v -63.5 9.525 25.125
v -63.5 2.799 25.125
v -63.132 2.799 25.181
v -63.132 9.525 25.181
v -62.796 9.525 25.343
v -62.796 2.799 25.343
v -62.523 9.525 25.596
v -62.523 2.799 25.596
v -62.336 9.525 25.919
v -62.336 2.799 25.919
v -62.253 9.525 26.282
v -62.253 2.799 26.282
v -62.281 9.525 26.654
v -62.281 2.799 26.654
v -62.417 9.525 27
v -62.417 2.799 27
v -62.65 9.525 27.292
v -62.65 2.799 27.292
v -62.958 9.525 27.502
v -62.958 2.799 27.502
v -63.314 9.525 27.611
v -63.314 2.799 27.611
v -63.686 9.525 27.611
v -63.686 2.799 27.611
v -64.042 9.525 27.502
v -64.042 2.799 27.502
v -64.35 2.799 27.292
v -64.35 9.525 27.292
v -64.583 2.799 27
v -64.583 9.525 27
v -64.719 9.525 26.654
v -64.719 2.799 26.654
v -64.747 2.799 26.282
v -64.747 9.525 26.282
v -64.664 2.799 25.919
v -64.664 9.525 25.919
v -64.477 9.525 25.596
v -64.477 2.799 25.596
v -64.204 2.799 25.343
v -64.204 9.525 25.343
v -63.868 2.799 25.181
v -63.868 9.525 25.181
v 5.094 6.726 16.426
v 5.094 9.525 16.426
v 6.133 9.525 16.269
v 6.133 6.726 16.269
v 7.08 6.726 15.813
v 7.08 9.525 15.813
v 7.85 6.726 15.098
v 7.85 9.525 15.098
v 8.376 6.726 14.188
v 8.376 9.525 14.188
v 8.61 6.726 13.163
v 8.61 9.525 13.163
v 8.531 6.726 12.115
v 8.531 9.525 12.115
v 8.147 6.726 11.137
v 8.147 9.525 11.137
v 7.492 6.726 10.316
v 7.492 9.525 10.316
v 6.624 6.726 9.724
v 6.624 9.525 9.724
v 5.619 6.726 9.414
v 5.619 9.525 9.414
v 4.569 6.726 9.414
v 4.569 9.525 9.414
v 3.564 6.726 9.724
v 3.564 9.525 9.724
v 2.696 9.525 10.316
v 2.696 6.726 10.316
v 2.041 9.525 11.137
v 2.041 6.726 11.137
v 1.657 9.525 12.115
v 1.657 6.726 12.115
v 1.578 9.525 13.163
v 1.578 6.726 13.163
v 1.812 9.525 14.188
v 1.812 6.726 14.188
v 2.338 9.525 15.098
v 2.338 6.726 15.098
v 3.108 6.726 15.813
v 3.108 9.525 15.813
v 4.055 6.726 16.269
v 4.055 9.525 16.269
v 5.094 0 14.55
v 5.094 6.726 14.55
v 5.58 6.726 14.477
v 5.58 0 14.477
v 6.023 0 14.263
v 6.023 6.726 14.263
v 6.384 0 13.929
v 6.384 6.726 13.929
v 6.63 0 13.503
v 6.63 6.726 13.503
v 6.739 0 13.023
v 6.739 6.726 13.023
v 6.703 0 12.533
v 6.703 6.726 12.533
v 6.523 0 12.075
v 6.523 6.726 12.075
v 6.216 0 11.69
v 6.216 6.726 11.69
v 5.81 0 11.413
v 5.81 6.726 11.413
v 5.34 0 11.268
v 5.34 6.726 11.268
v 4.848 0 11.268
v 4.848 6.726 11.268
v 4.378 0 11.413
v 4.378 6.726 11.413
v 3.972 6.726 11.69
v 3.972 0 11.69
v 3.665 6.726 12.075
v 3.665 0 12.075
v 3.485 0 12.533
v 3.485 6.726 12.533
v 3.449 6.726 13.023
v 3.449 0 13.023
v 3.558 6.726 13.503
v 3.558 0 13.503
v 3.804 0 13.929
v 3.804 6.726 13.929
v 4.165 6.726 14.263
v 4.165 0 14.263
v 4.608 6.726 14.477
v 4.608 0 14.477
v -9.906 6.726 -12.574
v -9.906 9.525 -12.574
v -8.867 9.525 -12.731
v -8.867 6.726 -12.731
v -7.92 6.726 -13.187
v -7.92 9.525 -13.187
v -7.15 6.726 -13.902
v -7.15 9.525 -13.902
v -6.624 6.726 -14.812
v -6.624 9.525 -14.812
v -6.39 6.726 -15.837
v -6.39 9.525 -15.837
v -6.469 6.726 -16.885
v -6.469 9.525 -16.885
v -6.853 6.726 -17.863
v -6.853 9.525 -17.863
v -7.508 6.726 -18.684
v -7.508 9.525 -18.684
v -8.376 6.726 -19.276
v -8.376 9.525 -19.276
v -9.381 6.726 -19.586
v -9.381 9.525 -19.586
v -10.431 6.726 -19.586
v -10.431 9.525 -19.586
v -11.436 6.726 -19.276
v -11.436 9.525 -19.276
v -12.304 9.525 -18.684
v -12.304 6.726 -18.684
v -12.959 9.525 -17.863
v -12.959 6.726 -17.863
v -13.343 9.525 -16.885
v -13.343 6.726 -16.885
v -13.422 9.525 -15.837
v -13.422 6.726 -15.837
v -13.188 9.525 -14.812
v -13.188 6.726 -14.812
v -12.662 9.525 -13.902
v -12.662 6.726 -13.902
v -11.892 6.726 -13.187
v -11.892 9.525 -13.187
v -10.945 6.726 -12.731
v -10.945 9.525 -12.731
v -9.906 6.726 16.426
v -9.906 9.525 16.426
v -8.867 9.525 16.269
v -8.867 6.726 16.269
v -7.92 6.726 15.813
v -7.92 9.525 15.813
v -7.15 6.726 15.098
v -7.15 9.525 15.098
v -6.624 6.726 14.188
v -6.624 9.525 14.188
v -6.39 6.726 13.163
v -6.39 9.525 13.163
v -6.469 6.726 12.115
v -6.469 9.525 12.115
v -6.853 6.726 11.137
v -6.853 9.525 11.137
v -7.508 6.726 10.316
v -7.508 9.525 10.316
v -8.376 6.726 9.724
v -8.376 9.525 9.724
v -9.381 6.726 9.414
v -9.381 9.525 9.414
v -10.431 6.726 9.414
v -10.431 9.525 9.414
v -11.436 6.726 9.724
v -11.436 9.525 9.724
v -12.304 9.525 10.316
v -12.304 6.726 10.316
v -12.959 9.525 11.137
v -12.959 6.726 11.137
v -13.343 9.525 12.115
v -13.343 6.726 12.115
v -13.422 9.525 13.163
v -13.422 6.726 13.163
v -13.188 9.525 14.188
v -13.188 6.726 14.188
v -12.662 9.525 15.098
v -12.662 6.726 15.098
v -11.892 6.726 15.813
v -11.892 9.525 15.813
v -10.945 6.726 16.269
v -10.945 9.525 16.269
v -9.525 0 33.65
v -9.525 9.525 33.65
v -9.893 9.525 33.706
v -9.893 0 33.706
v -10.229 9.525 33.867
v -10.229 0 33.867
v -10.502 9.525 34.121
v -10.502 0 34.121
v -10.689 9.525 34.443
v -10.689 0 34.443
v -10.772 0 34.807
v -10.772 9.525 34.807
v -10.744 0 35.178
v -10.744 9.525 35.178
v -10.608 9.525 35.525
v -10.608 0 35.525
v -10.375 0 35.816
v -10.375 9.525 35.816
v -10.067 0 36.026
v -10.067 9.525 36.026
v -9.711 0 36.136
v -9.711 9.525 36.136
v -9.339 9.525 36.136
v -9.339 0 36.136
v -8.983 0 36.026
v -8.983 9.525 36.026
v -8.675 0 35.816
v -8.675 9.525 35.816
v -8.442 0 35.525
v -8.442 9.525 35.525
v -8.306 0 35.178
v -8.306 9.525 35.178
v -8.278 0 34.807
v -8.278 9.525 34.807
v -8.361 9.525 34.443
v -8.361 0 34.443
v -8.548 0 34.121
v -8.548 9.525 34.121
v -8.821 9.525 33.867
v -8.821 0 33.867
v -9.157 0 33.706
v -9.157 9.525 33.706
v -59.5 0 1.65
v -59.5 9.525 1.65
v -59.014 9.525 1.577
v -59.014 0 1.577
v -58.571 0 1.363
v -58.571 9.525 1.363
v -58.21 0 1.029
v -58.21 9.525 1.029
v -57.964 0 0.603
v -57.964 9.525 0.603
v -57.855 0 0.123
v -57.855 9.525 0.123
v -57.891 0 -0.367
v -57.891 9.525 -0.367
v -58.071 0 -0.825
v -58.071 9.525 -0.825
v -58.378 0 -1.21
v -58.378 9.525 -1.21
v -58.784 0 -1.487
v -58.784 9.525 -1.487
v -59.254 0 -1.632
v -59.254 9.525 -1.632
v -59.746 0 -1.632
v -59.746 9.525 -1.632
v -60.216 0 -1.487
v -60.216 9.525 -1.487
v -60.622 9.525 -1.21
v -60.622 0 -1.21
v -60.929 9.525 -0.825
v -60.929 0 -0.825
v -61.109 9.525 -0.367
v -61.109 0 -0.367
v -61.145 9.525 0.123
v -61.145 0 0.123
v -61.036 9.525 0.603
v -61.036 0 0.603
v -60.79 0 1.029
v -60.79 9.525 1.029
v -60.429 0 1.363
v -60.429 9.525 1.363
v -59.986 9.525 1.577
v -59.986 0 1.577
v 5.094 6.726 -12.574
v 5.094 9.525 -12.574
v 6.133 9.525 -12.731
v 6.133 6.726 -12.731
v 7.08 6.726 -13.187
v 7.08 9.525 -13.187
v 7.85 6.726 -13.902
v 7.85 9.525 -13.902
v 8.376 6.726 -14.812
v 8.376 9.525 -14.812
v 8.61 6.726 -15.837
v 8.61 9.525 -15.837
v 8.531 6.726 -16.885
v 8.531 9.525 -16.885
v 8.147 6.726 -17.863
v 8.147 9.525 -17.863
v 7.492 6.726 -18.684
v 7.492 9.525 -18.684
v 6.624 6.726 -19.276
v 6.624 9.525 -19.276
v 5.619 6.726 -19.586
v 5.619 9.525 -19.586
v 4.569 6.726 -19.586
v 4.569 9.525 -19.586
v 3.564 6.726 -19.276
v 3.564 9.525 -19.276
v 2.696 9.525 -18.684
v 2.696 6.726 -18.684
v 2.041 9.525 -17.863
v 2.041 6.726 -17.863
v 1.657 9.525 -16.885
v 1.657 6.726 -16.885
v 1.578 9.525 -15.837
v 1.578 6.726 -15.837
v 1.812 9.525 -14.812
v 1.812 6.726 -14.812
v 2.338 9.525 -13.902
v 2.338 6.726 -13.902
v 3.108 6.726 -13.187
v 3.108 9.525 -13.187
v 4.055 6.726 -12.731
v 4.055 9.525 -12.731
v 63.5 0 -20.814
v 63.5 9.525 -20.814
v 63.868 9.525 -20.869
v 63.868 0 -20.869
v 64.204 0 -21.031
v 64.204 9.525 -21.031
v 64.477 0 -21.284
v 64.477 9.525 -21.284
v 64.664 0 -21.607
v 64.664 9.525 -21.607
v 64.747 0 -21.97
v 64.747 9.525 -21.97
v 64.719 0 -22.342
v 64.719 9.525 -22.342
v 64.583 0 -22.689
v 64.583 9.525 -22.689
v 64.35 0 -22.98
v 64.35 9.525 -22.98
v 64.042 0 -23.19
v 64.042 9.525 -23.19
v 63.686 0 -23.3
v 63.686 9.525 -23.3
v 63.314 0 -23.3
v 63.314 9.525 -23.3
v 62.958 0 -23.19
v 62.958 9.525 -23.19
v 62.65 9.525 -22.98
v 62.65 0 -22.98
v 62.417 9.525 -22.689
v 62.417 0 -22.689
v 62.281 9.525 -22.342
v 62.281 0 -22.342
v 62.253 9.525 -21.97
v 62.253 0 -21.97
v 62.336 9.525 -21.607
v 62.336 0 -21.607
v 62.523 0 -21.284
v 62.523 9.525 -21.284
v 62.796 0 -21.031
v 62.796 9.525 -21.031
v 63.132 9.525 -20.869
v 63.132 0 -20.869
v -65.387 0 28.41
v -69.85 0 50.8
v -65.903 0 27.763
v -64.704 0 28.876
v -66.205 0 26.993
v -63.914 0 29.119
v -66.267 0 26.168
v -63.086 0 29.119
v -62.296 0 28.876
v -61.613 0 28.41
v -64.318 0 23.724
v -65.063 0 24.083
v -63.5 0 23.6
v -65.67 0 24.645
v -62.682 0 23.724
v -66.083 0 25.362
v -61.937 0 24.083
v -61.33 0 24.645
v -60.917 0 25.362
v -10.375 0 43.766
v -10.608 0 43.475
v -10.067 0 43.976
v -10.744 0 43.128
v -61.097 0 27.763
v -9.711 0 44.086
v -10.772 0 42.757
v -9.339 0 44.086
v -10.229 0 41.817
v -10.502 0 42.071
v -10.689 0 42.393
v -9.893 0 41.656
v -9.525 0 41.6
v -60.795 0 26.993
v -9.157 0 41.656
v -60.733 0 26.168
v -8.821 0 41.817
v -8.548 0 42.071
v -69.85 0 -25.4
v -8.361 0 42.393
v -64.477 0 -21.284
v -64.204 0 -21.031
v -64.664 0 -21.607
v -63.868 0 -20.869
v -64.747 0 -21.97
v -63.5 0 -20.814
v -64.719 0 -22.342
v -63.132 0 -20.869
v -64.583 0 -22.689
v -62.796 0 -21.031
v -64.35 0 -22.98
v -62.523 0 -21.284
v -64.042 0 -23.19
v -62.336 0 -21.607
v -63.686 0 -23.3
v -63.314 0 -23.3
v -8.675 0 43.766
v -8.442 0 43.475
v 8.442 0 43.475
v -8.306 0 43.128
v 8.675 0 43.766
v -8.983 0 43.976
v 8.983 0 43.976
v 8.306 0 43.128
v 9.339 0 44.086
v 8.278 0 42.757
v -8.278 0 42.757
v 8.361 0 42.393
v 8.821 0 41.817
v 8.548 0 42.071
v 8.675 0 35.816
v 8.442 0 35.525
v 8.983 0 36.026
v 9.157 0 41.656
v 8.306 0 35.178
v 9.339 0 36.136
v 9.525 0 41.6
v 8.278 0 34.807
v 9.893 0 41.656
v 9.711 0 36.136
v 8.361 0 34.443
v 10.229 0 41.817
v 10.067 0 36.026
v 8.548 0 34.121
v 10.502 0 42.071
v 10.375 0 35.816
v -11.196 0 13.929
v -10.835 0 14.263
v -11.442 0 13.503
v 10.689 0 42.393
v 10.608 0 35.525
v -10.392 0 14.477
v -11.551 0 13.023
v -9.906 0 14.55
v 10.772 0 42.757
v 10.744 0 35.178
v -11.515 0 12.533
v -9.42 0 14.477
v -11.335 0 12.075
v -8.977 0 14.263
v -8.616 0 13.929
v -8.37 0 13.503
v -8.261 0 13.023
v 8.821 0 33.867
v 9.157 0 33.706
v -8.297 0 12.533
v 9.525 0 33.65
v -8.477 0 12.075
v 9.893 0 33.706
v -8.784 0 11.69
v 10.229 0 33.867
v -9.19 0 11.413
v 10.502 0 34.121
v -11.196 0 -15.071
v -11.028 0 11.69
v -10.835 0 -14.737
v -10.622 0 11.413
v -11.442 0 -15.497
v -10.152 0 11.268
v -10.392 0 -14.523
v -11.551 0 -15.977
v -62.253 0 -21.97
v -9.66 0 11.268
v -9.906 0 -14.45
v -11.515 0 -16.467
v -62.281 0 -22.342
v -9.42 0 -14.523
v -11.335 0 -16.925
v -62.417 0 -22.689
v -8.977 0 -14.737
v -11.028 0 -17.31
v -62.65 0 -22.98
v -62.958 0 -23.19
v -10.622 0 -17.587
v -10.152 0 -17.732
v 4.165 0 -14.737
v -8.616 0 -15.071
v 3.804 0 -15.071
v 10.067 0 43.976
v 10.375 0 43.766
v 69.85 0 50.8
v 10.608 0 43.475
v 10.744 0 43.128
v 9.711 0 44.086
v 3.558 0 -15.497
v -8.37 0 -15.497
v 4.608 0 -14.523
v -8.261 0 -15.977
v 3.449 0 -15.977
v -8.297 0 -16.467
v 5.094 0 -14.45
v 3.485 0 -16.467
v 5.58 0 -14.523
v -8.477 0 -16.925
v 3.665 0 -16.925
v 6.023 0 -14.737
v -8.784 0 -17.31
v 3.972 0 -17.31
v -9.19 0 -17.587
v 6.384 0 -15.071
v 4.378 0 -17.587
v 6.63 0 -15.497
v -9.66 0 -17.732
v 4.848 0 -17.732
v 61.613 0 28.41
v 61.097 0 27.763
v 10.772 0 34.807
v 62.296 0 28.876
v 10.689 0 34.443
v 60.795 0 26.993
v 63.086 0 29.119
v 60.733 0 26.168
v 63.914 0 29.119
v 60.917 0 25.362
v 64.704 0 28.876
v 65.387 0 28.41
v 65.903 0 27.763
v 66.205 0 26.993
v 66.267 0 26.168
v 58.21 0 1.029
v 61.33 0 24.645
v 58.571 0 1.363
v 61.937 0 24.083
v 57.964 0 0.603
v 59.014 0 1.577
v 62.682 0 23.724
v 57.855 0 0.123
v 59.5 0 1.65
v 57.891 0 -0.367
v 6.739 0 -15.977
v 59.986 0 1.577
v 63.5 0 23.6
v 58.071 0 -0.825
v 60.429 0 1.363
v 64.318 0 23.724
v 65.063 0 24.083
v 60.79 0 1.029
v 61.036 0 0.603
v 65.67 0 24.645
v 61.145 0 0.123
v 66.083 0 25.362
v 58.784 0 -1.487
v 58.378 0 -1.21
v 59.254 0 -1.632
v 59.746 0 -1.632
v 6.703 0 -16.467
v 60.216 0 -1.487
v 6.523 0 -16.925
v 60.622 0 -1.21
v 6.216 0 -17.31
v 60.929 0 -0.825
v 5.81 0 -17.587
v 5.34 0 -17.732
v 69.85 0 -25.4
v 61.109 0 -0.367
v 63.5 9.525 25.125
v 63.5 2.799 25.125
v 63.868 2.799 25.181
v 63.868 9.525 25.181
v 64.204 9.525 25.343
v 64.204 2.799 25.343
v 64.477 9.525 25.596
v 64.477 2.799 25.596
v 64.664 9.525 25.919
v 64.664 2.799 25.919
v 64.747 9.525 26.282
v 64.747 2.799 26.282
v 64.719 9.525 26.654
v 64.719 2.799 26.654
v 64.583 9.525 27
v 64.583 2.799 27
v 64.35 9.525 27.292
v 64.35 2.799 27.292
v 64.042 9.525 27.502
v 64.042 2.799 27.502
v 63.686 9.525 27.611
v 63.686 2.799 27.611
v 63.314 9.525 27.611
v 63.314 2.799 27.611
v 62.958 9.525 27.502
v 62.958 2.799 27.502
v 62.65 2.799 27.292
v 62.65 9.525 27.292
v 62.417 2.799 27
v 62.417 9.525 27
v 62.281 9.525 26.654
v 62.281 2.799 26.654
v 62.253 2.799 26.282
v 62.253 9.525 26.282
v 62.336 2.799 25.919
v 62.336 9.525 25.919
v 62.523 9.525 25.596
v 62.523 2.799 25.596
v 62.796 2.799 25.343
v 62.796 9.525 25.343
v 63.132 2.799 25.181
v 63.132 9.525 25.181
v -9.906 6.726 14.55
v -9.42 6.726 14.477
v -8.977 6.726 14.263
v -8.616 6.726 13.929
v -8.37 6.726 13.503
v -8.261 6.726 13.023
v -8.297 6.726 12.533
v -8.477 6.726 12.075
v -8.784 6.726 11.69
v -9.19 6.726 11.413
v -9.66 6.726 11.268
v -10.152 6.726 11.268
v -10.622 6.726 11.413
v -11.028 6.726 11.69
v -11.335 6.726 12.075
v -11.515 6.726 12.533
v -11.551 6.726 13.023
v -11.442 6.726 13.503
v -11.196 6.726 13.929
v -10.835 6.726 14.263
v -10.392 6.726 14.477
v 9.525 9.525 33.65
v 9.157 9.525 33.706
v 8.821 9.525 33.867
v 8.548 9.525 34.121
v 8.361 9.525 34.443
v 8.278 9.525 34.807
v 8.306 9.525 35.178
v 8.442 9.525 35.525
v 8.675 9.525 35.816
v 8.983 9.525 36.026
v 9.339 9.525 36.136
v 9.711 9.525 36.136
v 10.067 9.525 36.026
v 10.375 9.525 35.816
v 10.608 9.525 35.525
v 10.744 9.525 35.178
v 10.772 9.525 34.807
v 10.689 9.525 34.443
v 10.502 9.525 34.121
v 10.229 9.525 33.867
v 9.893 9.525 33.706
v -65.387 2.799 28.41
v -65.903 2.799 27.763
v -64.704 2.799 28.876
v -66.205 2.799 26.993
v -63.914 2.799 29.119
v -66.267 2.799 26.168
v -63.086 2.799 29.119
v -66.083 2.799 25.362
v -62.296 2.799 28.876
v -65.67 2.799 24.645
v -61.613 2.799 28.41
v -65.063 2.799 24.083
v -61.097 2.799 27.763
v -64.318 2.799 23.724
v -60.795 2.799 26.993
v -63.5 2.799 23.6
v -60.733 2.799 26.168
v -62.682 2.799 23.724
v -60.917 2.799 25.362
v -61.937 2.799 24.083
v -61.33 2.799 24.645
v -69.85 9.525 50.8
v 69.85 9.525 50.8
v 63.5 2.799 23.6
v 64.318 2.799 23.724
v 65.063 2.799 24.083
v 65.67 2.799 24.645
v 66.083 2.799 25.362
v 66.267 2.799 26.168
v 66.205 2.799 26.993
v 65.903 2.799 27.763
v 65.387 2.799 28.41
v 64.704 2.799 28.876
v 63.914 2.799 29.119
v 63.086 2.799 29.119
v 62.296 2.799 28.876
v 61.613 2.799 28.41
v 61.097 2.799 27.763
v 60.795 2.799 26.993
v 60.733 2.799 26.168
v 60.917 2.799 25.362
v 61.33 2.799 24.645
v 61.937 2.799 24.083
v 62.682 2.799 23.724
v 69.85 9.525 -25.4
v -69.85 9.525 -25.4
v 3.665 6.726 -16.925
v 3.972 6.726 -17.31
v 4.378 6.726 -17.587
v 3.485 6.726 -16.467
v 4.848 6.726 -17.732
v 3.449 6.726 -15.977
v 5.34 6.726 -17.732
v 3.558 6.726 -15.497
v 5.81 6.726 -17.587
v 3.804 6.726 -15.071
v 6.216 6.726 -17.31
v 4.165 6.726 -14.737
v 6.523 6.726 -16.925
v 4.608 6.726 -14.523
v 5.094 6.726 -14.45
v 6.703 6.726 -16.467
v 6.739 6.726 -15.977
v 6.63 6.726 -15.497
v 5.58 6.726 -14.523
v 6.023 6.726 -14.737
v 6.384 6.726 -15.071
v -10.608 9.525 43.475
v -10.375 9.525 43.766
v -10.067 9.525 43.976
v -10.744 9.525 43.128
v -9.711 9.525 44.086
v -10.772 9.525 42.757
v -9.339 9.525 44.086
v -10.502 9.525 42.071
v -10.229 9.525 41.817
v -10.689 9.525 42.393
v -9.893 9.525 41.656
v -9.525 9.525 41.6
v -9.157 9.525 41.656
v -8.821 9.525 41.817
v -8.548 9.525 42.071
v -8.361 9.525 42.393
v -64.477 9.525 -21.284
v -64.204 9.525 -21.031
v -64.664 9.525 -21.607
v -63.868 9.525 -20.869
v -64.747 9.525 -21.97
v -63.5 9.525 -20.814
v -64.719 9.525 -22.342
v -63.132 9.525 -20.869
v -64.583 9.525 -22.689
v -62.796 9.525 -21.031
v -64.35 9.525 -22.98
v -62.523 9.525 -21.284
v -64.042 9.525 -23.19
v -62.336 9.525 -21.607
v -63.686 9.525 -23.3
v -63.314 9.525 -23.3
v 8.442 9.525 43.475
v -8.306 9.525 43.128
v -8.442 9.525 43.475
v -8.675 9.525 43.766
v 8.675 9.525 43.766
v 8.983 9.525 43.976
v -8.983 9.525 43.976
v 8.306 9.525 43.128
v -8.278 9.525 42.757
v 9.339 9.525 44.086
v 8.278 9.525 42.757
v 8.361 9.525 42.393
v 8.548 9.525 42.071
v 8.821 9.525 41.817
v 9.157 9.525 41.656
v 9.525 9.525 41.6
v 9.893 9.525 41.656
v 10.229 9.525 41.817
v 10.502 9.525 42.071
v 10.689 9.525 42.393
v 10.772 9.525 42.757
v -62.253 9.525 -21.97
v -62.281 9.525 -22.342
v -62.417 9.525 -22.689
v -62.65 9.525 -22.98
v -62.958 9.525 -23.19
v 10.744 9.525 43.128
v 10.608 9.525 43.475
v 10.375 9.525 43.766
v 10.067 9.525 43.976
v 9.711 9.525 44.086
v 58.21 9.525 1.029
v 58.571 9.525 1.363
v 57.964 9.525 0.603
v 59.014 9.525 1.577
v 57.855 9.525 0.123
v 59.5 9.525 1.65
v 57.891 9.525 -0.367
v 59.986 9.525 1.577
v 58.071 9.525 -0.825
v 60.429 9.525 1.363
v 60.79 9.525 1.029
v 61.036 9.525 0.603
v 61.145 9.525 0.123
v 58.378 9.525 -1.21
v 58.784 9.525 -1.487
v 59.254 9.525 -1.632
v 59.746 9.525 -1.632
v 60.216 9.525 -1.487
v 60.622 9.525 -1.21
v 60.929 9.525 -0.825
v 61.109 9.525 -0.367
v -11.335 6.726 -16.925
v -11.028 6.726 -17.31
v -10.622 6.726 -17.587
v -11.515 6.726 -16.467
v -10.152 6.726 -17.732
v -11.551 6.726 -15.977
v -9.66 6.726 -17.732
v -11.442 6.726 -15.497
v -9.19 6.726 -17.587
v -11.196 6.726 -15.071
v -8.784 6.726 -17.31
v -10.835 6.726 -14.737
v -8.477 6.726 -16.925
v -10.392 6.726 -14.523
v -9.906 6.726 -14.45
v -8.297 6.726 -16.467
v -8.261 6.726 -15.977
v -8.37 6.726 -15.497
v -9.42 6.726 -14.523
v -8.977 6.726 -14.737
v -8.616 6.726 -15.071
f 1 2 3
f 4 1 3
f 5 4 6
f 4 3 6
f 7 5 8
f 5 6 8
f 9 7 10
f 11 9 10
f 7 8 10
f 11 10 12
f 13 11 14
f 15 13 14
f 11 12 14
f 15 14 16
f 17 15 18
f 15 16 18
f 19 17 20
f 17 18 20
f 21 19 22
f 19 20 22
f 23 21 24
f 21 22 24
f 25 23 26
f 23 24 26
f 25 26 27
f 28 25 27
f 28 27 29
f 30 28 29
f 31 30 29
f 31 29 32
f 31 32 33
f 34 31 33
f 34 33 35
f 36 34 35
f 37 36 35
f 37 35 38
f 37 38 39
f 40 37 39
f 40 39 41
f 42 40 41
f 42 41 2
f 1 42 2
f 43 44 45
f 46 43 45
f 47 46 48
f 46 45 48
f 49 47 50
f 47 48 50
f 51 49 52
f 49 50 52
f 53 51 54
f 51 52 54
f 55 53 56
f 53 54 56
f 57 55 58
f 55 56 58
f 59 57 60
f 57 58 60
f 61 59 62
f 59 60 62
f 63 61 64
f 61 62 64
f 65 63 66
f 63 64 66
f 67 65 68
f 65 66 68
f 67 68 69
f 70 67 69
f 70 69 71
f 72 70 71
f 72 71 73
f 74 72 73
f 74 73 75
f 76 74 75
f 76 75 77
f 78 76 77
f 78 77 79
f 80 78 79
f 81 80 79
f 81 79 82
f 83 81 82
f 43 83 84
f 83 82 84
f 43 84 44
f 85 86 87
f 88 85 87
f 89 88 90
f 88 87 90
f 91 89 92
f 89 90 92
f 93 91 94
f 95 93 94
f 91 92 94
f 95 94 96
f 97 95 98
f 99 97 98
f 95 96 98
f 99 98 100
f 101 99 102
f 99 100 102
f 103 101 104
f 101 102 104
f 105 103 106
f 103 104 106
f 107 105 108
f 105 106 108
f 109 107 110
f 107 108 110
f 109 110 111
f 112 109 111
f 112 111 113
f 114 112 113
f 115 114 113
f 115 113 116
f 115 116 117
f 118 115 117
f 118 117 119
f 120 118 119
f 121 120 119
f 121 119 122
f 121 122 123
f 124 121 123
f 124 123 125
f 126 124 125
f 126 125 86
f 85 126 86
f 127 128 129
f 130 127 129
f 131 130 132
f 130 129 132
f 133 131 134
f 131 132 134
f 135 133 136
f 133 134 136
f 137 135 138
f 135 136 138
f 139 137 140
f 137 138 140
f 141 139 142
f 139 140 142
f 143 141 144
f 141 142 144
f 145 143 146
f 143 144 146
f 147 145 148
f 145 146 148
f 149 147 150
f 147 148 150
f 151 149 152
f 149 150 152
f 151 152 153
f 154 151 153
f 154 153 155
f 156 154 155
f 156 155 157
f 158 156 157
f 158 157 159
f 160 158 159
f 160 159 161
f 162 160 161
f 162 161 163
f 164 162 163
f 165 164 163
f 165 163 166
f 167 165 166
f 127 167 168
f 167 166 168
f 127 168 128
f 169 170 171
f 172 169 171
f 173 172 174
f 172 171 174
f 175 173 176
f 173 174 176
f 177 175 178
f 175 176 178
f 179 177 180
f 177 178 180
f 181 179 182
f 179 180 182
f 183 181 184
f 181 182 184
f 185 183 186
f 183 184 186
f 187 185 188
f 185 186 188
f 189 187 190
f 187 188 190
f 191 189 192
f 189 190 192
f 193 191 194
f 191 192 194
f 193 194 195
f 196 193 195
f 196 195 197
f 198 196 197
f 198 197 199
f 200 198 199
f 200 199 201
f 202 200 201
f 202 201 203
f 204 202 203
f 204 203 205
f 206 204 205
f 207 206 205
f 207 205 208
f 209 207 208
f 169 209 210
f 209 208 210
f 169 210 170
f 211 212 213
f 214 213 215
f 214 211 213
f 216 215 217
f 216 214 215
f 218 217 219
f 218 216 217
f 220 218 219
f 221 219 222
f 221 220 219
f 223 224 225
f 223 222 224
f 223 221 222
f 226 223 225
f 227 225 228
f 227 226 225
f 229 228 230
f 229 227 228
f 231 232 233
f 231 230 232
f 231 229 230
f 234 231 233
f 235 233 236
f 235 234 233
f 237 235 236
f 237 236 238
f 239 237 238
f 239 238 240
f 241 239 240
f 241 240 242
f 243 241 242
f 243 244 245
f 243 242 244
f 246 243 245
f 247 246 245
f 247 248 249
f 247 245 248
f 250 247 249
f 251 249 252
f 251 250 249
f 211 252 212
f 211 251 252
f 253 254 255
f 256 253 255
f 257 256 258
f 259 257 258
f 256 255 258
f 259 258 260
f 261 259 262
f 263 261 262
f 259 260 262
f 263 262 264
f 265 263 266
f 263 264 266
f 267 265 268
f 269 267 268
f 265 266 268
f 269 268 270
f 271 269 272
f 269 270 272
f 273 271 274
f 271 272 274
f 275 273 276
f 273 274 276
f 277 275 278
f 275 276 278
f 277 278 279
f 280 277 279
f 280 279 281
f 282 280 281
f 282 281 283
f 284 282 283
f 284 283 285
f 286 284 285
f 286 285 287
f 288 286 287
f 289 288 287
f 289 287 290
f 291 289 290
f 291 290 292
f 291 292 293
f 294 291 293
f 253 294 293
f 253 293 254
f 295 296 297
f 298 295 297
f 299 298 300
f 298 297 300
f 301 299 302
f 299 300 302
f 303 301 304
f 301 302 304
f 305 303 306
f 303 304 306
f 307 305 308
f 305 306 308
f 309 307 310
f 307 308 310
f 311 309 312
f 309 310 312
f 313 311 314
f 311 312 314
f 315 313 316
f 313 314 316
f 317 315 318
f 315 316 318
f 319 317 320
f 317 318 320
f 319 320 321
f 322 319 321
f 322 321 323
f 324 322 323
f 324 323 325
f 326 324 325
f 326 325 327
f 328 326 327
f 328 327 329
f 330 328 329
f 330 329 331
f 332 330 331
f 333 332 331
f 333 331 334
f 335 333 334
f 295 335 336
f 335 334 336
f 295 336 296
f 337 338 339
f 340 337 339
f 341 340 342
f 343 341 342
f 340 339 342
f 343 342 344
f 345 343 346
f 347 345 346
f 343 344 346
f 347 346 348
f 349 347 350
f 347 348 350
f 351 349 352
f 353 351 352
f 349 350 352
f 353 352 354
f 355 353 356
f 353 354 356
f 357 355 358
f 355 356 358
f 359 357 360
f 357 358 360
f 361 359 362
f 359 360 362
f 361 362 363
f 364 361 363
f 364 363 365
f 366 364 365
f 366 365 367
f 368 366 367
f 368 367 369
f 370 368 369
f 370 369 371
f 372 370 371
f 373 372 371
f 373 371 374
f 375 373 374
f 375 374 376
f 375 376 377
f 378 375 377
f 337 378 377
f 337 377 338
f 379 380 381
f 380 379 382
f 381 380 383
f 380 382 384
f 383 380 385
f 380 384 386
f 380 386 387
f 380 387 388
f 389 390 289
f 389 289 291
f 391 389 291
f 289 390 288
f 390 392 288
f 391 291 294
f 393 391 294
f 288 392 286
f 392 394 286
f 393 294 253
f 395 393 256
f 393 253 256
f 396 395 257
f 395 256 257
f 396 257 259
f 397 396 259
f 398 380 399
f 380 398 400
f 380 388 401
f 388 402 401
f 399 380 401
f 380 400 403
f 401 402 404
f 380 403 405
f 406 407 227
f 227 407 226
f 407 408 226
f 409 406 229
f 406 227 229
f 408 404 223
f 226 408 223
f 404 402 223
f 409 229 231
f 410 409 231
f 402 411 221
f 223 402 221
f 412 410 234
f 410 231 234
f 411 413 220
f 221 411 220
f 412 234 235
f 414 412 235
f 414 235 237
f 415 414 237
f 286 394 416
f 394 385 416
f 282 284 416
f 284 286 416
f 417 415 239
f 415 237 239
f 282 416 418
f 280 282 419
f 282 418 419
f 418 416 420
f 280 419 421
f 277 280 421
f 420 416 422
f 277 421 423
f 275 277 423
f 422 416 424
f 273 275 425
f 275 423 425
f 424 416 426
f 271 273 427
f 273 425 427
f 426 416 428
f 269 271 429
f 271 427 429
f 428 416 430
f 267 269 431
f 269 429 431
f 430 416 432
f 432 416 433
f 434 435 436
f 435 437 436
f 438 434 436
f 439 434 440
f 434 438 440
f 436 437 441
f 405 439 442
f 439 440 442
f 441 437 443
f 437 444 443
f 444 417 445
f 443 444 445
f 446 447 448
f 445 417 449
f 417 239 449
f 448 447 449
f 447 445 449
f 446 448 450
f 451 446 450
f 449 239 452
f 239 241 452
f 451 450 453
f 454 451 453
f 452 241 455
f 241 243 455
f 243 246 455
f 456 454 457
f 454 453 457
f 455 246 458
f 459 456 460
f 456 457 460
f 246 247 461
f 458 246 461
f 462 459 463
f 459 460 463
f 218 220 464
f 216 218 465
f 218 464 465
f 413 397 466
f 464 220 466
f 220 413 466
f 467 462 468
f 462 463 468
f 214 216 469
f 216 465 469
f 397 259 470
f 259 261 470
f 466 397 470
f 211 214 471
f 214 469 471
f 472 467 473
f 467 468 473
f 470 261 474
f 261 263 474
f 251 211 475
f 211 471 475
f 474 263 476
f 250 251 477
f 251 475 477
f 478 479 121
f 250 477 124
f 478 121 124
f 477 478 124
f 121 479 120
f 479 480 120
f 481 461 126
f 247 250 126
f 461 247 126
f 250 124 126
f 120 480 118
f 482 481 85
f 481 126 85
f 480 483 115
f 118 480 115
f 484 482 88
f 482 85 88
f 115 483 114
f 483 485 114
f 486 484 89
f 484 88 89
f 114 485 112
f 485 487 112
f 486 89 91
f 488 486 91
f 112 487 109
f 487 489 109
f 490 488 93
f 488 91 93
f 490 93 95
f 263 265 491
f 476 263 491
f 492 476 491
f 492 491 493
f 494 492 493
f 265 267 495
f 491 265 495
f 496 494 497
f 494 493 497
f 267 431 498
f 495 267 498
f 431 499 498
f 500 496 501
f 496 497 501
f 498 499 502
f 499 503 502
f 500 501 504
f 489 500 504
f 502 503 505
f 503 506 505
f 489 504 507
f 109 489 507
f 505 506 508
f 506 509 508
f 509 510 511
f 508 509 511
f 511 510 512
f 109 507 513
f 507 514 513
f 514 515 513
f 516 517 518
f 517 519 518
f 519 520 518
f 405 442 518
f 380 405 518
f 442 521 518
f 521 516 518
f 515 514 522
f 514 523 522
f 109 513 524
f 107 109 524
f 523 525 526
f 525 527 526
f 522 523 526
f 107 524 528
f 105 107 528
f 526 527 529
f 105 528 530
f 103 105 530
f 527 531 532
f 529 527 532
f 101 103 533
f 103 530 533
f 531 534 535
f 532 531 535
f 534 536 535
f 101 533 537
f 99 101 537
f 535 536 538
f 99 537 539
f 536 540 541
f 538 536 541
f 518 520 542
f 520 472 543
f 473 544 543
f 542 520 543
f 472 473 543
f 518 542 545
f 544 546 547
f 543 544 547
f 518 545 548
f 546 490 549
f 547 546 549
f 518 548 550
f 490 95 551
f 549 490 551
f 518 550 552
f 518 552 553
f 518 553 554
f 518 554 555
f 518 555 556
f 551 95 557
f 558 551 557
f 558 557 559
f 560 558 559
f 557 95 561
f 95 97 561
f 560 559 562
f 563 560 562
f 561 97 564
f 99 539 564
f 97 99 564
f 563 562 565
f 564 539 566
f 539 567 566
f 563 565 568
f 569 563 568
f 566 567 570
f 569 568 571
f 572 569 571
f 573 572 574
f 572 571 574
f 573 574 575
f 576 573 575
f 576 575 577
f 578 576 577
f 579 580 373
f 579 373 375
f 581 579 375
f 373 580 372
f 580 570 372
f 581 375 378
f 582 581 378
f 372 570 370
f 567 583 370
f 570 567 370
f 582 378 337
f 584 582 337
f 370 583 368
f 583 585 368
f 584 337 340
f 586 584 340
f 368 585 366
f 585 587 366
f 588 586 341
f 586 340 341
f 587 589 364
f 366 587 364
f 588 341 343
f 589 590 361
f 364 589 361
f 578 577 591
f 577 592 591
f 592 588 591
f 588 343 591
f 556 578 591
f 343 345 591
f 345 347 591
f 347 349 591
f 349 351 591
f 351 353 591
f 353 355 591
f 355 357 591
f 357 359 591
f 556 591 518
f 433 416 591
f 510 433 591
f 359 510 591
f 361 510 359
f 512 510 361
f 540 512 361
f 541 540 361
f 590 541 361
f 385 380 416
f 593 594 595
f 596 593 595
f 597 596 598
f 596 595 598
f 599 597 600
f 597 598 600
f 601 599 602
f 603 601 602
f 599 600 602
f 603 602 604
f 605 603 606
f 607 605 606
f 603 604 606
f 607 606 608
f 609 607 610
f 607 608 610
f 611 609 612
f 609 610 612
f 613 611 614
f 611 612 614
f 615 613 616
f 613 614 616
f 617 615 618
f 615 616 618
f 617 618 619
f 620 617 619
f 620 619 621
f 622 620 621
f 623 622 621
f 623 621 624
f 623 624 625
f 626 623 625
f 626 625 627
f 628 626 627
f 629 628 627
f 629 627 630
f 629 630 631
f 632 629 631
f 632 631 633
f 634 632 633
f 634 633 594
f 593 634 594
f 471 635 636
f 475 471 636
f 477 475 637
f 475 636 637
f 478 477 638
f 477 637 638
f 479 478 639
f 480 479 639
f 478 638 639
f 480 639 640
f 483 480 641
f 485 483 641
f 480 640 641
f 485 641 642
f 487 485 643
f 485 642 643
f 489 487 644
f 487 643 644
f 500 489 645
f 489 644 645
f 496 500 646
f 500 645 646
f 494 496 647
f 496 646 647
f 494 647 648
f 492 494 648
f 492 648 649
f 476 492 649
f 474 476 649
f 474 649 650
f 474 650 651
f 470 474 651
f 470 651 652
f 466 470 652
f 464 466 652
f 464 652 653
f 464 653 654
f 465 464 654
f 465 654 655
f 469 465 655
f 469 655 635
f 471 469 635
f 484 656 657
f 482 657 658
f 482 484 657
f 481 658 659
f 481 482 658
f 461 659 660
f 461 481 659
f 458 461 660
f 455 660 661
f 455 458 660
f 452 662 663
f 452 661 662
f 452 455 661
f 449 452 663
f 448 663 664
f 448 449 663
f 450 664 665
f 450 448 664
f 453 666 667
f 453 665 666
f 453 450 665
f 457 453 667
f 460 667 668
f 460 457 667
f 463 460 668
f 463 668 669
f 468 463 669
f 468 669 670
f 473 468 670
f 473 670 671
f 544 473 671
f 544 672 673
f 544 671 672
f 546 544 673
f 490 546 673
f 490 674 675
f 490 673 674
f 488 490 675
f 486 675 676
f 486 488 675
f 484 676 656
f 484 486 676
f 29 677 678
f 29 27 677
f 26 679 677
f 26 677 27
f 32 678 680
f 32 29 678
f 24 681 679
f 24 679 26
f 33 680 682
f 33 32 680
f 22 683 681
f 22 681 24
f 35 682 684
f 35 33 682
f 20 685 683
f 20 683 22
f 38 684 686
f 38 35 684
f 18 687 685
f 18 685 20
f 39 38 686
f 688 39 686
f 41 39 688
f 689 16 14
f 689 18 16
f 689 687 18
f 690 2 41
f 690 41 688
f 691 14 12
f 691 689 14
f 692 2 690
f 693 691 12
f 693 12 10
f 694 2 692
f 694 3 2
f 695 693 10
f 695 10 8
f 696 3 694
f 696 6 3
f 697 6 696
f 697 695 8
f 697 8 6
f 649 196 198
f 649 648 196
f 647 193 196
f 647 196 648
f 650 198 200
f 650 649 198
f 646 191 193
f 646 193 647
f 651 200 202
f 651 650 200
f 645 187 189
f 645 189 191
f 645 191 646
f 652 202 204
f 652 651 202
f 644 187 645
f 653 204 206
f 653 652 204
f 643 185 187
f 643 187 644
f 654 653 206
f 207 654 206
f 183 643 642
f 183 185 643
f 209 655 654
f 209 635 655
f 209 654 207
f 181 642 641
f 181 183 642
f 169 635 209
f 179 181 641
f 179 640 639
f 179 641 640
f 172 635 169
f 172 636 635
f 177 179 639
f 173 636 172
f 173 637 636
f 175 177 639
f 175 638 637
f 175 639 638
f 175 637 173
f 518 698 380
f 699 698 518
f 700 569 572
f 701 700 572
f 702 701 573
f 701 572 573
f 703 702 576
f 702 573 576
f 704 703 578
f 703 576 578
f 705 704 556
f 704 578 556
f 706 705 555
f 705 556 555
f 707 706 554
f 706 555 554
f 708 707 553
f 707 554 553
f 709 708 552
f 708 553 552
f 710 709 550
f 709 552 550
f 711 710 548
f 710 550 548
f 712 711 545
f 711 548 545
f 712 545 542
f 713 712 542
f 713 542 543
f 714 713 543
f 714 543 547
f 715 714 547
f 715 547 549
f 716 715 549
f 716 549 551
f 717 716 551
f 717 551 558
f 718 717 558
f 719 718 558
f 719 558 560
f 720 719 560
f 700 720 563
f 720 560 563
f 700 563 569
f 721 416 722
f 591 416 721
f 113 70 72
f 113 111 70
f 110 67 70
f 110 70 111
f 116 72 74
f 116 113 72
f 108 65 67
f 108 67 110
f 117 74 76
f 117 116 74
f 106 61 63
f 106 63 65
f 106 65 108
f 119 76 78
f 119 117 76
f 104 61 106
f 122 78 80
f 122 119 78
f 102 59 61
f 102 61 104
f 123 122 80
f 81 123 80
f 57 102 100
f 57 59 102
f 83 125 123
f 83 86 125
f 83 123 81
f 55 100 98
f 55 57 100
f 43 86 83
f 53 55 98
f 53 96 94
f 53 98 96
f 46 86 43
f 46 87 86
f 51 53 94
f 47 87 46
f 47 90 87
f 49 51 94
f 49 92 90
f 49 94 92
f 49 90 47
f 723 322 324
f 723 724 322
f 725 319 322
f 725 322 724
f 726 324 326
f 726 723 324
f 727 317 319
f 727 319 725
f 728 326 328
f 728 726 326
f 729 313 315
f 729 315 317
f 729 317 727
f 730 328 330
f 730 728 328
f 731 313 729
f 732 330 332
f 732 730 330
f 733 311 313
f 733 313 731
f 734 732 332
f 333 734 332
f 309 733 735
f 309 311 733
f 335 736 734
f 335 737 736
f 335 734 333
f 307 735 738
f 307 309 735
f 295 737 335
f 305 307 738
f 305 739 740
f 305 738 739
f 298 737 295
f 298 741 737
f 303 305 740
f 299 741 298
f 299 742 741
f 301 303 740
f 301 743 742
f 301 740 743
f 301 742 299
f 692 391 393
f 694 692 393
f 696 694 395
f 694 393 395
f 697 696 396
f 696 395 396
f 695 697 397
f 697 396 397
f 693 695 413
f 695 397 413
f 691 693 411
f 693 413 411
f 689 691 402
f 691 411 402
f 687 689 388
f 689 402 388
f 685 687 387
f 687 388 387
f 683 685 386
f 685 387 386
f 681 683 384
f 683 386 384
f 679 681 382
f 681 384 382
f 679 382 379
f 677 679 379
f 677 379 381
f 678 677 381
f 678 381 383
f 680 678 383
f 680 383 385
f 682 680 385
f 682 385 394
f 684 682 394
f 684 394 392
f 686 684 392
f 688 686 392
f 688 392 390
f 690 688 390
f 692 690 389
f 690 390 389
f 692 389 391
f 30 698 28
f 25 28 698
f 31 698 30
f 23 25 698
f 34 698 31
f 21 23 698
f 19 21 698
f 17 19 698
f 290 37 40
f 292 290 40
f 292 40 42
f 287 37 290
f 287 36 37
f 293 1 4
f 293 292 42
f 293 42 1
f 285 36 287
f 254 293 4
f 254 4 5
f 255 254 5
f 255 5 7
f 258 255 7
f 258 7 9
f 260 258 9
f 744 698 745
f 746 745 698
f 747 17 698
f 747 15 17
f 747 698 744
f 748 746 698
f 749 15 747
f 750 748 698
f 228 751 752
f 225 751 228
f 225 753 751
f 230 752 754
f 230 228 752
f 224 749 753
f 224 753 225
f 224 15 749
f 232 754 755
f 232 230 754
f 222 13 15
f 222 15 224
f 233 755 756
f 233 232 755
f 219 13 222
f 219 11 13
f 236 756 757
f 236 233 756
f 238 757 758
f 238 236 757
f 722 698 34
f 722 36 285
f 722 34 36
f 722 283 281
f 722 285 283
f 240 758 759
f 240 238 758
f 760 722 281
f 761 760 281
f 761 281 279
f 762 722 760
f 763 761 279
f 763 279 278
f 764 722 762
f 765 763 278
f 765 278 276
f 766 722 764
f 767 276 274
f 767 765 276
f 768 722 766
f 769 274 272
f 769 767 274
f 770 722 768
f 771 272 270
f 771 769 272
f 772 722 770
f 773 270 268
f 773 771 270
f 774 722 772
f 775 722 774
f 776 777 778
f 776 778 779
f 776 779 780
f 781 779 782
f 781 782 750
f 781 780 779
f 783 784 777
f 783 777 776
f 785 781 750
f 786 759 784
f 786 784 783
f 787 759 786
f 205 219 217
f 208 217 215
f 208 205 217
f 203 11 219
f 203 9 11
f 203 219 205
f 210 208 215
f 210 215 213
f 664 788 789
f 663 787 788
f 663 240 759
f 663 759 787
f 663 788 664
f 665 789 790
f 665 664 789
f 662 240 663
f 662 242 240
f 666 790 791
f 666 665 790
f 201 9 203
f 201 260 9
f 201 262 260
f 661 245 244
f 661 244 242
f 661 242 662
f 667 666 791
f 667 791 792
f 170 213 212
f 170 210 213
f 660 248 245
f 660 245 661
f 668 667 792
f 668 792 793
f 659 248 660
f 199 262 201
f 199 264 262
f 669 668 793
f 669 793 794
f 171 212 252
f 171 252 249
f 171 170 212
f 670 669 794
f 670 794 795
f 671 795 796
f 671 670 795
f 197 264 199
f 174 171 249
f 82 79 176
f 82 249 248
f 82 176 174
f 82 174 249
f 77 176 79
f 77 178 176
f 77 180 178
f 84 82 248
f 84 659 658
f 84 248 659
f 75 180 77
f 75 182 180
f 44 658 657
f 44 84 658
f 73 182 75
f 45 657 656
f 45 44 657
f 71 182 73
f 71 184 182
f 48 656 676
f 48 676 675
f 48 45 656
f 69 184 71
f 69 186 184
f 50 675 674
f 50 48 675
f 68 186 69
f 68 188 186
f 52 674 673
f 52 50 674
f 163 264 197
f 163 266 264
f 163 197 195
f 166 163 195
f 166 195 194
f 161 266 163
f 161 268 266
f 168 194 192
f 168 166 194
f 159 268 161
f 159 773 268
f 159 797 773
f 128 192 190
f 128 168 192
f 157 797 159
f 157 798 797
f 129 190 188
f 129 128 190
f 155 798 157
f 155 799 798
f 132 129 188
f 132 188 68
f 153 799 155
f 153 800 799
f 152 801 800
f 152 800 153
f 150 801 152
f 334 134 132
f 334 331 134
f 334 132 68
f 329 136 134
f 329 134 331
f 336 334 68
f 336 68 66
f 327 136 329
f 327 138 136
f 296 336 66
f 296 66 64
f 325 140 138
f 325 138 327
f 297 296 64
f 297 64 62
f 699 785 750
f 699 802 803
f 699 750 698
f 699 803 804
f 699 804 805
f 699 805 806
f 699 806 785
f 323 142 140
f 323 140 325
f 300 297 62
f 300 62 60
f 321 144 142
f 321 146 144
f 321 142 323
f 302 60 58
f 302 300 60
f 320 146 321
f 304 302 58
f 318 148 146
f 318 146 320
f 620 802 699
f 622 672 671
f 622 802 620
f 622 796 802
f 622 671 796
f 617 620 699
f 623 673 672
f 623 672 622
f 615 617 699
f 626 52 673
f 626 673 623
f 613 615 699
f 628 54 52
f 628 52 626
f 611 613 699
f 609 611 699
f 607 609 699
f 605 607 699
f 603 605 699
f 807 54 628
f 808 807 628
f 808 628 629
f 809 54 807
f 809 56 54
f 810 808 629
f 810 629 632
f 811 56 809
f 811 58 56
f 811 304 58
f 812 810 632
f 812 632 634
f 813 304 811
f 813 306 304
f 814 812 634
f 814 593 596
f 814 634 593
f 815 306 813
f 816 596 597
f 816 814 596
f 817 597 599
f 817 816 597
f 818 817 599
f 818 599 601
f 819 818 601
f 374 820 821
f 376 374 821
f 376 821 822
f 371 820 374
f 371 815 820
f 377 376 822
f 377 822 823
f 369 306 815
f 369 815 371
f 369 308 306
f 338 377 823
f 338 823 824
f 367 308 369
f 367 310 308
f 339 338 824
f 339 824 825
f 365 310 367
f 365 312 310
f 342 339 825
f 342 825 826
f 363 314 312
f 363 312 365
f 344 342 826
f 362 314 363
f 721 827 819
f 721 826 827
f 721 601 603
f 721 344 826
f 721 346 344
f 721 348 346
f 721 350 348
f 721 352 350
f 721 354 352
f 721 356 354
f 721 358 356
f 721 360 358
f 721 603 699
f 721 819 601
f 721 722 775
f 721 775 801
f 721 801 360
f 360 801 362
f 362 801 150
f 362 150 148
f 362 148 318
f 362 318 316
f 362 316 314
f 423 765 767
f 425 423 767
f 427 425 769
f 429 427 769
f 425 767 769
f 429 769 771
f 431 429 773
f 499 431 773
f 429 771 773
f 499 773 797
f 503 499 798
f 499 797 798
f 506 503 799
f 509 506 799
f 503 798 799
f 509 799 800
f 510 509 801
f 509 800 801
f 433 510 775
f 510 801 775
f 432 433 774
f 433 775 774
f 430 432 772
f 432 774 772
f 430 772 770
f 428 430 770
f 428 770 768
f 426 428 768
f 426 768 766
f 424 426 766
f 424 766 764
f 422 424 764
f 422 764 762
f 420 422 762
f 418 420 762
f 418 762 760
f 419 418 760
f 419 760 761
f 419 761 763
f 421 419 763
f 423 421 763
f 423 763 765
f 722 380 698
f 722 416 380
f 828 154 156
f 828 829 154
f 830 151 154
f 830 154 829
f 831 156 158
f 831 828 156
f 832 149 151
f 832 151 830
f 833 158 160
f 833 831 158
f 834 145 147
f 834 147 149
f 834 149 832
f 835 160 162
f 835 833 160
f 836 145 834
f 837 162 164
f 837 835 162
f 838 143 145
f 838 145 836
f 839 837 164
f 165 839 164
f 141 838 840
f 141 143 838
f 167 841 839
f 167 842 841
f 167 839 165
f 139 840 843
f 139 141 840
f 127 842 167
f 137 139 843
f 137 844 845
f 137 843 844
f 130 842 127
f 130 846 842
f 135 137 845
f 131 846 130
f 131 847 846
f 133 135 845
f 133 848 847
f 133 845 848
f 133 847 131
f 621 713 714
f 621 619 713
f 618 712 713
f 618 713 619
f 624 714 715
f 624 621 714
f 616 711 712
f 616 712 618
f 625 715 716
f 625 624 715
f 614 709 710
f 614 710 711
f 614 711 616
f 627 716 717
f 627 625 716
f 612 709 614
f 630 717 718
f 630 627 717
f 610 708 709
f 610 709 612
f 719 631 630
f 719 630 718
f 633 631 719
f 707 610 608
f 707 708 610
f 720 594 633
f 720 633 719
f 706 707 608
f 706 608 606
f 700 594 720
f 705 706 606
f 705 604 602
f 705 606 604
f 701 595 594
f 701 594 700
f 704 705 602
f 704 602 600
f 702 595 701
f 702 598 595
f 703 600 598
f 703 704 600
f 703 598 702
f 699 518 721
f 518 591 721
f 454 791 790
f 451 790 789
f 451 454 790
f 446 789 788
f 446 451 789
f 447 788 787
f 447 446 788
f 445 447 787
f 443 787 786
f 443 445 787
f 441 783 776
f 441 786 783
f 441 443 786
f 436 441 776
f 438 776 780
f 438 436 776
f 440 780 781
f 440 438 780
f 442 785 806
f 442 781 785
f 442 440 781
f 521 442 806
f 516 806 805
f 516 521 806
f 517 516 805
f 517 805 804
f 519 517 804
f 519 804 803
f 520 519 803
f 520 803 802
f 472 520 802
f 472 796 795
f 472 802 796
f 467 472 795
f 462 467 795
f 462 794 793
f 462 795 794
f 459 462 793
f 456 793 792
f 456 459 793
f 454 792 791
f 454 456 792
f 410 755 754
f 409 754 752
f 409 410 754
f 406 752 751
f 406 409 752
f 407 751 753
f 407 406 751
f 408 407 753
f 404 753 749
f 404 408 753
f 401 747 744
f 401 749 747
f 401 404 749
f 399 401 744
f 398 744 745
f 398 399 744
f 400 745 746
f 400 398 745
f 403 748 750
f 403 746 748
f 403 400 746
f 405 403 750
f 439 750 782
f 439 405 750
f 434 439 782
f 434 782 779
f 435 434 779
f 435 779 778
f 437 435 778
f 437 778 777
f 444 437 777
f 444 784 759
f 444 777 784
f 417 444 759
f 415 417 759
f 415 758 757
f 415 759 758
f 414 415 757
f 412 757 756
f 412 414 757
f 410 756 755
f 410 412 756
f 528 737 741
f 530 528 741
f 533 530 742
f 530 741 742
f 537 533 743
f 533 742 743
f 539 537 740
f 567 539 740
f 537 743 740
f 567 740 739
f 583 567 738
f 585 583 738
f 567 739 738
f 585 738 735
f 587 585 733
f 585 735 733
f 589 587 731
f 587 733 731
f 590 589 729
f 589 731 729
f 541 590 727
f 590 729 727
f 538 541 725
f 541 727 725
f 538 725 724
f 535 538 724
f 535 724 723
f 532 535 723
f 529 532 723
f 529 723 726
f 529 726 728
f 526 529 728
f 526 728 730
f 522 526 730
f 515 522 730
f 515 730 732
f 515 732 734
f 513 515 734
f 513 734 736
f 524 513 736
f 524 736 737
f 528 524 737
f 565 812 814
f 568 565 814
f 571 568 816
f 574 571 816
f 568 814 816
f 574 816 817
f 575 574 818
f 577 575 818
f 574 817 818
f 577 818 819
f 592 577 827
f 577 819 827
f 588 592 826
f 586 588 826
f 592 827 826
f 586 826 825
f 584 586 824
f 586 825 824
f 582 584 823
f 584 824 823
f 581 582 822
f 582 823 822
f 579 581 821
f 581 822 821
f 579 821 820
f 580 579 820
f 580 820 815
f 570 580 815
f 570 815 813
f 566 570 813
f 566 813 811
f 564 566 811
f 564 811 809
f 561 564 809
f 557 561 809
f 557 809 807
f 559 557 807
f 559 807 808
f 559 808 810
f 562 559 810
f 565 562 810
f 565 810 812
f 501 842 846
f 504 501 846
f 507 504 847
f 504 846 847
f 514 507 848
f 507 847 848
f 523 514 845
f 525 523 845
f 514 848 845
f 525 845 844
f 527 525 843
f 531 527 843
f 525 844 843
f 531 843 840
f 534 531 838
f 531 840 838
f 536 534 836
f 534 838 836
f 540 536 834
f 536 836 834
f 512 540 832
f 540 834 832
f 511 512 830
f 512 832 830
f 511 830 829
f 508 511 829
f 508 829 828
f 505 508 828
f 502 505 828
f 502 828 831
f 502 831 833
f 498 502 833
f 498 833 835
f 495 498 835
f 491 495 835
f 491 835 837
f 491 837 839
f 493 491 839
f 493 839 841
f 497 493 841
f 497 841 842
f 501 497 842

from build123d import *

# Parameters (mm, degrees)
SKETCH1_W           = 139.7
SKETCH1_H           = 50.8
BOSS_EXTRUDE1_DEPTH = 9.525
SKETCH13_W          = 139.7
SKETCH13_H          = 9.525
BOSS_EXTRUDE2_DEPTH = 25.4
SKETCH45_R          = 2.77495
CUT_EXTRUDE3_DEPTH  = 2.79908
SKETCH47_R          = 1.25
CUT_EXTRUDE4_DEPTH  = 87.892969365
SKETCH2_R           = 1.65
CUT_EXTRUDE5_DEPTH  = 87.892969365
SKETCH50_R          = 3.52552
CUT_EXTRUDE6_DEPTH  = 2.79908
SKETCH51_R          = 1.25
CUT_EXTRUDE10_DEPTH = 87.892969365
SKETCH35_R          = 1.25
CUT_EXTRUDE11_DEPTH = 87.892969365


with BuildPart() as part:
    # Sketch1 → Boss-Extrude1 (new body)
    with BuildSketch(Plane(origin=(0, 0, 0), x_dir=(1, 0, 0), z_dir=(0, 1, 0))):
        Rectangle(SKETCH1_W, SKETCH1_H)
    extrude(amount=BOSS_EXTRUDE1_DEPTH)

    # Sketch13 → Boss-Extrude2 (add)
    with BuildSketch(Plane.XY.offset(25.4)):
        with Locations((0, 4.7625)):
            Rectangle(SKETCH13_W, SKETCH13_H)
    extrude(amount=BOSS_EXTRUDE2_DEPTH)

    # Sketch45 → Cut-Extrude3 (cut)
    with BuildSketch(Plane.XZ):
        with Locations(Location((63.5, 26.37536, 0), (0, 0, 270))):
            Circle(SKETCH45_R)
        with Locations(Location((-63.5, 26.37536, 0), (0, 0, 270))):
            Circle(SKETCH45_R)
    extrude(amount=-CUT_EXTRUDE3_DEPTH, mode=Mode.SUBTRACT)

    # Sketch47 → Cut-Extrude4 (cut, through all)
    with BuildSketch(Plane.XZ):
        with Locations(Location((63.5, 26.37536, 0), (0, 0, 270))):
            Circle(SKETCH47_R)
        with Locations(Location((-63.5, 26.37536, 0), (0, 0, 270))):
            Circle(SKETCH47_R)
    extrude(amount=-CUT_EXTRUDE4_DEPTH, mode=Mode.SUBTRACT)

    # Sketch2 → Cut-Extrude5 (cut, through all)
    with BuildSketch(Plane(origin=(0, 9.525, 0), x_dir=(1, 0, 0), z_dir=(0, 1, 0))):
        with Locations(Location((-9.906, 16.1, 0), (0, 0, 270))):
            Circle(SKETCH2_R)
        with Locations(Location((5.094, 16.1, 0), (0, 0, 270))):
            Circle(SKETCH2_R)
        with Locations(Location((-9.906, -12.9, 0), (0, 0, 270))):
            Circle(SKETCH2_R)
        with Locations(Location((5.094, -12.9, 0), (0, 0, 270))):
            Circle(SKETCH2_R)
        with Locations(Location((-59.5, 0, 0), (0, 0, 270))):
            Circle(SKETCH2_R)
        with Locations(Location((59.5, 0, 0), (0, 0, 270))):
            Circle(SKETCH2_R)
    extrude(amount=-CUT_EXTRUDE5_DEPTH, mode=Mode.SUBTRACT)

    # Sketch50 → Cut-Extrude6 (cut)
    with BuildSketch(Plane(origin=(0, 9.525, 0), x_dir=(1, 0, 0), z_dir=(0, 1, 0))):
        with Locations(Location((-9.906, 16.1, 0), (0, 0, 270))):
            Circle(SKETCH50_R)
        with Locations(Location((5.094, 16.1, 0), (0, 0, 270))):
            Circle(SKETCH50_R)
        with Locations(Location((5.094, -12.9, 0), (0, 0, 270))):
            Circle(SKETCH50_R)
        with Locations(Location((-9.906, -12.9, 0), (0, 0, 270))):
            Circle(SKETCH50_R)
    extrude(amount=-CUT_EXTRUDE6_DEPTH, mode=Mode.SUBTRACT)

    # Sketch51 → Cut-Extrude10 (cut, through all)
    with BuildSketch(Plane(origin=(0, 9.525, 0), x_dir=(1, 0, 0), z_dir=(0, 1, 0))):
        with Locations(Location((-63.5, 22.06371, 0), (0, 0, 270))):
            Circle(SKETCH51_R)
        with Locations(Location((63.5, 22.06371, 0), (0, 0, 270))):
            Circle(SKETCH51_R)
    extrude(amount=-CUT_EXTRUDE10_DEPTH, mode=Mode.SUBTRACT)

    # Sketch35 → Cut-Extrude11 (cut, through all)
    with BuildSketch(Plane(origin=(0, 0, 0), x_dir=(1, 0, 0), z_dir=(0, 1, 0))):
        with Locations(Location((9.525, -34.9, 0), (0, 0, 90))):
            Circle(SKETCH35_R)
        with Locations(Location((-9.525, -34.9, 0), (0, 0, 90))):
            Circle(SKETCH35_R)
        with Locations(Location((-9.525, -42.85, 0), (0, 0, 90))):
            Circle(SKETCH35_R)
        with Locations(Location((9.525, -42.85, 0), (0, 0, 90))):
            Circle(SKETCH35_R)
    extrude(amount=CUT_EXTRUDE11_DEPTH, mode=Mode.SUBTRACT)


solid = part.part
